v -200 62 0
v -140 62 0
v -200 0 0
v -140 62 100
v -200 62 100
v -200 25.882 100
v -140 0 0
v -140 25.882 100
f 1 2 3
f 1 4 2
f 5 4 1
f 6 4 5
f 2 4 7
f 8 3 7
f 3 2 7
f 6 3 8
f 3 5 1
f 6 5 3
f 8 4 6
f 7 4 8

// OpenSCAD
card_width = 40;
card_height = 70;
card_thickness = .6;

wall_thickness = 1.6;
base_thickness = 1.6;

bottom_offset = card_height / 4;

overhang = 2;

padding_width = .2;
padding_per_card = .05;

side_width = wall_thickness*2+padding_width*2 + card_width;
tray_depth = wall_thickness*3  + (padding_per_card + card_thickness)*10;
tray_height = wall_thickness + card_height;

tray_core_width = tray_depth;
shaft_offset = 3;
shaft_length = 200;
shaft_width = tray_core_width - shaft_offset;
shaft_tolerance = [0.24, 0.2, 0];

angle = 15;
M = [ [ 1  , 0  , 0  , 0   ],
[ 0  , 1  , sin(angle)  , 0   ],  // The skew value; pushed along the y axis as z changes.
[ 0  , 0  , 1  , 0   ],
[ 0  , 0  , 0  , 1   ] ] ;


module left_edge(height)
{
   // left edge
   cube([wall_thickness, tray_depth, height]);
   // left overhang front
   cube([wall_thickness+overhang, wall_thickness, height]);
   // left overhang back
   translate([0,tray_depth-wall_thickness, 0])
   cube([wall_thickness+overhang, wall_thickness, height]);
}


module tray_side()
{
   // bottom
   cube([side_width, tray_depth, base_thickness]);
   // front lip
   cube([side_width, wall_thickness, overhang+wall_thickness]);
   left_edge(tray_height);
   translate([side_width, 0, 0])
   mirror([1, 0, 0]) left_edge(card_height * 2 / 3);
   //middle wall
   translate([0, wall_thickness + card_thickness+padding_per_card, 0])
   cube([side_width, wall_thickness, tray_height]);
   // base offset
   translate([0, wall_thickness+padding_per_card+card_thickness,0])
   cube([side_width, tray_depth - (wall_thickness+padding_per_card+card_thickness), bottom_offset]);
   //back wall
   translate([0, tray_depth - wall_thickness, 0])
   cube([side_width, wall_thickness, bottom_offset + overhang]);

}

module tray()
{
   union(){
      rotate([0,0,180])
      translate([0,-tray_depth, 0])
      tray_side();
      translate([tray_core_width, 0, 0])
      tray_side();
      cube([tray_core_width, tray_depth, tray_height]);
   }
}

module shaft(c)
{
   cube(c,center=true);
}


module knob(height, d1, d2, gaps=5, fillet=2)
{
   linear_extrude(height)
   {
      offset(r = fillet)
      {
         difference()
         {
            circle(d=d1);
            for (i=[0:gaps-1])
            {
               rotate([0,0,(360/gaps)*i])
               translate([d1/2, 0, -1])
               circle(d=d2);
            }
         }
      }
   }
}

// this cylinder version imports into Freecad but lacks the radius effect of above
module knob2(height, d1, d2, gaps=5, fillet=2)
{
      //offset(r = fillet)
      //{
         difference()
         {
            cylinder(h=height, d=d1);
            for (i=[0:gaps-1])
            {
               rotate([0,0,(360/gaps)*i])
                  translate([d1/2, 0, 0])
                     cylinder(h=height,d=d2);
            }
         }
      //}
}



module base()
{
   hull()
   {
      multmatrix(M)
      {
         cube(size=[60,2,100],center=false);
      }
      translate([0,60,0])
      cube([60,2,100]);
   }
}

//
// d1 = overall diameter
// d2 = inner circle diameter
// d3 = diameter of end points
module clicker(height, d1, d2, d3, spokes)
{
   linear_extrude(height)
   {
      circle(d=d2);
      for (i=[0:spokes-1])
      {
         rotate([0,0,(360/spokes)*i])
            translate([(d1 - d3)/2, 0, 0])
               circle(d=d3);

      }
      for (i=[0:spokes-1])
      {
         rotate([0,0,(360/spokes)*i + 360 / (spokes*.8)])
            square([d1/2 - d3, 2]);
      }
   }

   for (i=[0:spokes-1])
   {
         rotate([0,0, (360/spokes)*i + 360 / (spokes*.8)])
            rotate_extrude(angle=360/spokes - 360 *.2 / spokes  , convexity=4)
               translate([d1/2- d3, 0, 0])
                  square([2,height]);
   }
}

module gap(offset, height, d1, d2, angle)
{
   rotate([0,0,offset])
      rotate_extrude(angle=angle-offset, convexity=4)
         translate([d1 / 2 - d2, 0, 0])
            square([4, height]);
   rotate([0, 0, angle ])
      translate([d1/2 - d2, 0, 0])
         cube([8,8,height]);

}

module end_stop(angle, d1, d2, height)
{
   rotate([0, 0, angle])
      translate([d1/2 , 0, 0])
         cylinder(h=height, d=d2);
}

module clicker2(height, d1, d2, stops)
{
   offset = 30;
   angle = 180 - 180 / stops;
   difference()
   {
      linear_extrude(height)
      {
         circle(d=d1);
      }
      gap(offset, height, d1, d2, angle);
      mirror([0,1,0])
      {
         gap(offset, height, d1, d2, angle);
      }
   }
   end_stop(angle, d1, d2, height);
   mirror([0,1,0])
      end_stop(angle, d1, d2, height);
}

module clicker_cutout(height, d1, d2, stops)
{
   cylinder(h=height, d=d1);
   for (i=[0:stops-1])
   {
      rotate([0,0,(360/stops)*i])
         translate([d1/2, 0, 0])
            cylinder(h=height, d=d2);
   }
}

//////////////////////////////////////////////////////////////////
/*
translate([200,-200,0])
   clicker_cutout(height=10, d1=60-.2, d2=6+.2, stops = 4);
*/
//translate([0,200,0])
//   clicker(height=10, d1=60, d2=40, d3=6, spokes=4);
/*
translate([200,200,0])
   clicker2(height=10, d1=60, d2=6, stops=4
   );
*/

translate([-200,0,0])
   base();

/*
translate([200,0,0])
   knob2(height=6, d1=42, d2=16, fillet=2);
   */
/*
shaft_cube = [shaft_width, shaft_width, shaft_length];
translate([(shaft_offset+shaft_width)/2, (shaft_offset+shaft_width)/2, -10])
{
   shaft(shaft_cube);

}
/*
/*
difference()
{
   tray();
   translate([(shaft_offset+shaft_width)/2, (shaft_offset+shaft_width)/2, -10])
   shaft(shaft_cube + shaft_tolerance);
}
*/
